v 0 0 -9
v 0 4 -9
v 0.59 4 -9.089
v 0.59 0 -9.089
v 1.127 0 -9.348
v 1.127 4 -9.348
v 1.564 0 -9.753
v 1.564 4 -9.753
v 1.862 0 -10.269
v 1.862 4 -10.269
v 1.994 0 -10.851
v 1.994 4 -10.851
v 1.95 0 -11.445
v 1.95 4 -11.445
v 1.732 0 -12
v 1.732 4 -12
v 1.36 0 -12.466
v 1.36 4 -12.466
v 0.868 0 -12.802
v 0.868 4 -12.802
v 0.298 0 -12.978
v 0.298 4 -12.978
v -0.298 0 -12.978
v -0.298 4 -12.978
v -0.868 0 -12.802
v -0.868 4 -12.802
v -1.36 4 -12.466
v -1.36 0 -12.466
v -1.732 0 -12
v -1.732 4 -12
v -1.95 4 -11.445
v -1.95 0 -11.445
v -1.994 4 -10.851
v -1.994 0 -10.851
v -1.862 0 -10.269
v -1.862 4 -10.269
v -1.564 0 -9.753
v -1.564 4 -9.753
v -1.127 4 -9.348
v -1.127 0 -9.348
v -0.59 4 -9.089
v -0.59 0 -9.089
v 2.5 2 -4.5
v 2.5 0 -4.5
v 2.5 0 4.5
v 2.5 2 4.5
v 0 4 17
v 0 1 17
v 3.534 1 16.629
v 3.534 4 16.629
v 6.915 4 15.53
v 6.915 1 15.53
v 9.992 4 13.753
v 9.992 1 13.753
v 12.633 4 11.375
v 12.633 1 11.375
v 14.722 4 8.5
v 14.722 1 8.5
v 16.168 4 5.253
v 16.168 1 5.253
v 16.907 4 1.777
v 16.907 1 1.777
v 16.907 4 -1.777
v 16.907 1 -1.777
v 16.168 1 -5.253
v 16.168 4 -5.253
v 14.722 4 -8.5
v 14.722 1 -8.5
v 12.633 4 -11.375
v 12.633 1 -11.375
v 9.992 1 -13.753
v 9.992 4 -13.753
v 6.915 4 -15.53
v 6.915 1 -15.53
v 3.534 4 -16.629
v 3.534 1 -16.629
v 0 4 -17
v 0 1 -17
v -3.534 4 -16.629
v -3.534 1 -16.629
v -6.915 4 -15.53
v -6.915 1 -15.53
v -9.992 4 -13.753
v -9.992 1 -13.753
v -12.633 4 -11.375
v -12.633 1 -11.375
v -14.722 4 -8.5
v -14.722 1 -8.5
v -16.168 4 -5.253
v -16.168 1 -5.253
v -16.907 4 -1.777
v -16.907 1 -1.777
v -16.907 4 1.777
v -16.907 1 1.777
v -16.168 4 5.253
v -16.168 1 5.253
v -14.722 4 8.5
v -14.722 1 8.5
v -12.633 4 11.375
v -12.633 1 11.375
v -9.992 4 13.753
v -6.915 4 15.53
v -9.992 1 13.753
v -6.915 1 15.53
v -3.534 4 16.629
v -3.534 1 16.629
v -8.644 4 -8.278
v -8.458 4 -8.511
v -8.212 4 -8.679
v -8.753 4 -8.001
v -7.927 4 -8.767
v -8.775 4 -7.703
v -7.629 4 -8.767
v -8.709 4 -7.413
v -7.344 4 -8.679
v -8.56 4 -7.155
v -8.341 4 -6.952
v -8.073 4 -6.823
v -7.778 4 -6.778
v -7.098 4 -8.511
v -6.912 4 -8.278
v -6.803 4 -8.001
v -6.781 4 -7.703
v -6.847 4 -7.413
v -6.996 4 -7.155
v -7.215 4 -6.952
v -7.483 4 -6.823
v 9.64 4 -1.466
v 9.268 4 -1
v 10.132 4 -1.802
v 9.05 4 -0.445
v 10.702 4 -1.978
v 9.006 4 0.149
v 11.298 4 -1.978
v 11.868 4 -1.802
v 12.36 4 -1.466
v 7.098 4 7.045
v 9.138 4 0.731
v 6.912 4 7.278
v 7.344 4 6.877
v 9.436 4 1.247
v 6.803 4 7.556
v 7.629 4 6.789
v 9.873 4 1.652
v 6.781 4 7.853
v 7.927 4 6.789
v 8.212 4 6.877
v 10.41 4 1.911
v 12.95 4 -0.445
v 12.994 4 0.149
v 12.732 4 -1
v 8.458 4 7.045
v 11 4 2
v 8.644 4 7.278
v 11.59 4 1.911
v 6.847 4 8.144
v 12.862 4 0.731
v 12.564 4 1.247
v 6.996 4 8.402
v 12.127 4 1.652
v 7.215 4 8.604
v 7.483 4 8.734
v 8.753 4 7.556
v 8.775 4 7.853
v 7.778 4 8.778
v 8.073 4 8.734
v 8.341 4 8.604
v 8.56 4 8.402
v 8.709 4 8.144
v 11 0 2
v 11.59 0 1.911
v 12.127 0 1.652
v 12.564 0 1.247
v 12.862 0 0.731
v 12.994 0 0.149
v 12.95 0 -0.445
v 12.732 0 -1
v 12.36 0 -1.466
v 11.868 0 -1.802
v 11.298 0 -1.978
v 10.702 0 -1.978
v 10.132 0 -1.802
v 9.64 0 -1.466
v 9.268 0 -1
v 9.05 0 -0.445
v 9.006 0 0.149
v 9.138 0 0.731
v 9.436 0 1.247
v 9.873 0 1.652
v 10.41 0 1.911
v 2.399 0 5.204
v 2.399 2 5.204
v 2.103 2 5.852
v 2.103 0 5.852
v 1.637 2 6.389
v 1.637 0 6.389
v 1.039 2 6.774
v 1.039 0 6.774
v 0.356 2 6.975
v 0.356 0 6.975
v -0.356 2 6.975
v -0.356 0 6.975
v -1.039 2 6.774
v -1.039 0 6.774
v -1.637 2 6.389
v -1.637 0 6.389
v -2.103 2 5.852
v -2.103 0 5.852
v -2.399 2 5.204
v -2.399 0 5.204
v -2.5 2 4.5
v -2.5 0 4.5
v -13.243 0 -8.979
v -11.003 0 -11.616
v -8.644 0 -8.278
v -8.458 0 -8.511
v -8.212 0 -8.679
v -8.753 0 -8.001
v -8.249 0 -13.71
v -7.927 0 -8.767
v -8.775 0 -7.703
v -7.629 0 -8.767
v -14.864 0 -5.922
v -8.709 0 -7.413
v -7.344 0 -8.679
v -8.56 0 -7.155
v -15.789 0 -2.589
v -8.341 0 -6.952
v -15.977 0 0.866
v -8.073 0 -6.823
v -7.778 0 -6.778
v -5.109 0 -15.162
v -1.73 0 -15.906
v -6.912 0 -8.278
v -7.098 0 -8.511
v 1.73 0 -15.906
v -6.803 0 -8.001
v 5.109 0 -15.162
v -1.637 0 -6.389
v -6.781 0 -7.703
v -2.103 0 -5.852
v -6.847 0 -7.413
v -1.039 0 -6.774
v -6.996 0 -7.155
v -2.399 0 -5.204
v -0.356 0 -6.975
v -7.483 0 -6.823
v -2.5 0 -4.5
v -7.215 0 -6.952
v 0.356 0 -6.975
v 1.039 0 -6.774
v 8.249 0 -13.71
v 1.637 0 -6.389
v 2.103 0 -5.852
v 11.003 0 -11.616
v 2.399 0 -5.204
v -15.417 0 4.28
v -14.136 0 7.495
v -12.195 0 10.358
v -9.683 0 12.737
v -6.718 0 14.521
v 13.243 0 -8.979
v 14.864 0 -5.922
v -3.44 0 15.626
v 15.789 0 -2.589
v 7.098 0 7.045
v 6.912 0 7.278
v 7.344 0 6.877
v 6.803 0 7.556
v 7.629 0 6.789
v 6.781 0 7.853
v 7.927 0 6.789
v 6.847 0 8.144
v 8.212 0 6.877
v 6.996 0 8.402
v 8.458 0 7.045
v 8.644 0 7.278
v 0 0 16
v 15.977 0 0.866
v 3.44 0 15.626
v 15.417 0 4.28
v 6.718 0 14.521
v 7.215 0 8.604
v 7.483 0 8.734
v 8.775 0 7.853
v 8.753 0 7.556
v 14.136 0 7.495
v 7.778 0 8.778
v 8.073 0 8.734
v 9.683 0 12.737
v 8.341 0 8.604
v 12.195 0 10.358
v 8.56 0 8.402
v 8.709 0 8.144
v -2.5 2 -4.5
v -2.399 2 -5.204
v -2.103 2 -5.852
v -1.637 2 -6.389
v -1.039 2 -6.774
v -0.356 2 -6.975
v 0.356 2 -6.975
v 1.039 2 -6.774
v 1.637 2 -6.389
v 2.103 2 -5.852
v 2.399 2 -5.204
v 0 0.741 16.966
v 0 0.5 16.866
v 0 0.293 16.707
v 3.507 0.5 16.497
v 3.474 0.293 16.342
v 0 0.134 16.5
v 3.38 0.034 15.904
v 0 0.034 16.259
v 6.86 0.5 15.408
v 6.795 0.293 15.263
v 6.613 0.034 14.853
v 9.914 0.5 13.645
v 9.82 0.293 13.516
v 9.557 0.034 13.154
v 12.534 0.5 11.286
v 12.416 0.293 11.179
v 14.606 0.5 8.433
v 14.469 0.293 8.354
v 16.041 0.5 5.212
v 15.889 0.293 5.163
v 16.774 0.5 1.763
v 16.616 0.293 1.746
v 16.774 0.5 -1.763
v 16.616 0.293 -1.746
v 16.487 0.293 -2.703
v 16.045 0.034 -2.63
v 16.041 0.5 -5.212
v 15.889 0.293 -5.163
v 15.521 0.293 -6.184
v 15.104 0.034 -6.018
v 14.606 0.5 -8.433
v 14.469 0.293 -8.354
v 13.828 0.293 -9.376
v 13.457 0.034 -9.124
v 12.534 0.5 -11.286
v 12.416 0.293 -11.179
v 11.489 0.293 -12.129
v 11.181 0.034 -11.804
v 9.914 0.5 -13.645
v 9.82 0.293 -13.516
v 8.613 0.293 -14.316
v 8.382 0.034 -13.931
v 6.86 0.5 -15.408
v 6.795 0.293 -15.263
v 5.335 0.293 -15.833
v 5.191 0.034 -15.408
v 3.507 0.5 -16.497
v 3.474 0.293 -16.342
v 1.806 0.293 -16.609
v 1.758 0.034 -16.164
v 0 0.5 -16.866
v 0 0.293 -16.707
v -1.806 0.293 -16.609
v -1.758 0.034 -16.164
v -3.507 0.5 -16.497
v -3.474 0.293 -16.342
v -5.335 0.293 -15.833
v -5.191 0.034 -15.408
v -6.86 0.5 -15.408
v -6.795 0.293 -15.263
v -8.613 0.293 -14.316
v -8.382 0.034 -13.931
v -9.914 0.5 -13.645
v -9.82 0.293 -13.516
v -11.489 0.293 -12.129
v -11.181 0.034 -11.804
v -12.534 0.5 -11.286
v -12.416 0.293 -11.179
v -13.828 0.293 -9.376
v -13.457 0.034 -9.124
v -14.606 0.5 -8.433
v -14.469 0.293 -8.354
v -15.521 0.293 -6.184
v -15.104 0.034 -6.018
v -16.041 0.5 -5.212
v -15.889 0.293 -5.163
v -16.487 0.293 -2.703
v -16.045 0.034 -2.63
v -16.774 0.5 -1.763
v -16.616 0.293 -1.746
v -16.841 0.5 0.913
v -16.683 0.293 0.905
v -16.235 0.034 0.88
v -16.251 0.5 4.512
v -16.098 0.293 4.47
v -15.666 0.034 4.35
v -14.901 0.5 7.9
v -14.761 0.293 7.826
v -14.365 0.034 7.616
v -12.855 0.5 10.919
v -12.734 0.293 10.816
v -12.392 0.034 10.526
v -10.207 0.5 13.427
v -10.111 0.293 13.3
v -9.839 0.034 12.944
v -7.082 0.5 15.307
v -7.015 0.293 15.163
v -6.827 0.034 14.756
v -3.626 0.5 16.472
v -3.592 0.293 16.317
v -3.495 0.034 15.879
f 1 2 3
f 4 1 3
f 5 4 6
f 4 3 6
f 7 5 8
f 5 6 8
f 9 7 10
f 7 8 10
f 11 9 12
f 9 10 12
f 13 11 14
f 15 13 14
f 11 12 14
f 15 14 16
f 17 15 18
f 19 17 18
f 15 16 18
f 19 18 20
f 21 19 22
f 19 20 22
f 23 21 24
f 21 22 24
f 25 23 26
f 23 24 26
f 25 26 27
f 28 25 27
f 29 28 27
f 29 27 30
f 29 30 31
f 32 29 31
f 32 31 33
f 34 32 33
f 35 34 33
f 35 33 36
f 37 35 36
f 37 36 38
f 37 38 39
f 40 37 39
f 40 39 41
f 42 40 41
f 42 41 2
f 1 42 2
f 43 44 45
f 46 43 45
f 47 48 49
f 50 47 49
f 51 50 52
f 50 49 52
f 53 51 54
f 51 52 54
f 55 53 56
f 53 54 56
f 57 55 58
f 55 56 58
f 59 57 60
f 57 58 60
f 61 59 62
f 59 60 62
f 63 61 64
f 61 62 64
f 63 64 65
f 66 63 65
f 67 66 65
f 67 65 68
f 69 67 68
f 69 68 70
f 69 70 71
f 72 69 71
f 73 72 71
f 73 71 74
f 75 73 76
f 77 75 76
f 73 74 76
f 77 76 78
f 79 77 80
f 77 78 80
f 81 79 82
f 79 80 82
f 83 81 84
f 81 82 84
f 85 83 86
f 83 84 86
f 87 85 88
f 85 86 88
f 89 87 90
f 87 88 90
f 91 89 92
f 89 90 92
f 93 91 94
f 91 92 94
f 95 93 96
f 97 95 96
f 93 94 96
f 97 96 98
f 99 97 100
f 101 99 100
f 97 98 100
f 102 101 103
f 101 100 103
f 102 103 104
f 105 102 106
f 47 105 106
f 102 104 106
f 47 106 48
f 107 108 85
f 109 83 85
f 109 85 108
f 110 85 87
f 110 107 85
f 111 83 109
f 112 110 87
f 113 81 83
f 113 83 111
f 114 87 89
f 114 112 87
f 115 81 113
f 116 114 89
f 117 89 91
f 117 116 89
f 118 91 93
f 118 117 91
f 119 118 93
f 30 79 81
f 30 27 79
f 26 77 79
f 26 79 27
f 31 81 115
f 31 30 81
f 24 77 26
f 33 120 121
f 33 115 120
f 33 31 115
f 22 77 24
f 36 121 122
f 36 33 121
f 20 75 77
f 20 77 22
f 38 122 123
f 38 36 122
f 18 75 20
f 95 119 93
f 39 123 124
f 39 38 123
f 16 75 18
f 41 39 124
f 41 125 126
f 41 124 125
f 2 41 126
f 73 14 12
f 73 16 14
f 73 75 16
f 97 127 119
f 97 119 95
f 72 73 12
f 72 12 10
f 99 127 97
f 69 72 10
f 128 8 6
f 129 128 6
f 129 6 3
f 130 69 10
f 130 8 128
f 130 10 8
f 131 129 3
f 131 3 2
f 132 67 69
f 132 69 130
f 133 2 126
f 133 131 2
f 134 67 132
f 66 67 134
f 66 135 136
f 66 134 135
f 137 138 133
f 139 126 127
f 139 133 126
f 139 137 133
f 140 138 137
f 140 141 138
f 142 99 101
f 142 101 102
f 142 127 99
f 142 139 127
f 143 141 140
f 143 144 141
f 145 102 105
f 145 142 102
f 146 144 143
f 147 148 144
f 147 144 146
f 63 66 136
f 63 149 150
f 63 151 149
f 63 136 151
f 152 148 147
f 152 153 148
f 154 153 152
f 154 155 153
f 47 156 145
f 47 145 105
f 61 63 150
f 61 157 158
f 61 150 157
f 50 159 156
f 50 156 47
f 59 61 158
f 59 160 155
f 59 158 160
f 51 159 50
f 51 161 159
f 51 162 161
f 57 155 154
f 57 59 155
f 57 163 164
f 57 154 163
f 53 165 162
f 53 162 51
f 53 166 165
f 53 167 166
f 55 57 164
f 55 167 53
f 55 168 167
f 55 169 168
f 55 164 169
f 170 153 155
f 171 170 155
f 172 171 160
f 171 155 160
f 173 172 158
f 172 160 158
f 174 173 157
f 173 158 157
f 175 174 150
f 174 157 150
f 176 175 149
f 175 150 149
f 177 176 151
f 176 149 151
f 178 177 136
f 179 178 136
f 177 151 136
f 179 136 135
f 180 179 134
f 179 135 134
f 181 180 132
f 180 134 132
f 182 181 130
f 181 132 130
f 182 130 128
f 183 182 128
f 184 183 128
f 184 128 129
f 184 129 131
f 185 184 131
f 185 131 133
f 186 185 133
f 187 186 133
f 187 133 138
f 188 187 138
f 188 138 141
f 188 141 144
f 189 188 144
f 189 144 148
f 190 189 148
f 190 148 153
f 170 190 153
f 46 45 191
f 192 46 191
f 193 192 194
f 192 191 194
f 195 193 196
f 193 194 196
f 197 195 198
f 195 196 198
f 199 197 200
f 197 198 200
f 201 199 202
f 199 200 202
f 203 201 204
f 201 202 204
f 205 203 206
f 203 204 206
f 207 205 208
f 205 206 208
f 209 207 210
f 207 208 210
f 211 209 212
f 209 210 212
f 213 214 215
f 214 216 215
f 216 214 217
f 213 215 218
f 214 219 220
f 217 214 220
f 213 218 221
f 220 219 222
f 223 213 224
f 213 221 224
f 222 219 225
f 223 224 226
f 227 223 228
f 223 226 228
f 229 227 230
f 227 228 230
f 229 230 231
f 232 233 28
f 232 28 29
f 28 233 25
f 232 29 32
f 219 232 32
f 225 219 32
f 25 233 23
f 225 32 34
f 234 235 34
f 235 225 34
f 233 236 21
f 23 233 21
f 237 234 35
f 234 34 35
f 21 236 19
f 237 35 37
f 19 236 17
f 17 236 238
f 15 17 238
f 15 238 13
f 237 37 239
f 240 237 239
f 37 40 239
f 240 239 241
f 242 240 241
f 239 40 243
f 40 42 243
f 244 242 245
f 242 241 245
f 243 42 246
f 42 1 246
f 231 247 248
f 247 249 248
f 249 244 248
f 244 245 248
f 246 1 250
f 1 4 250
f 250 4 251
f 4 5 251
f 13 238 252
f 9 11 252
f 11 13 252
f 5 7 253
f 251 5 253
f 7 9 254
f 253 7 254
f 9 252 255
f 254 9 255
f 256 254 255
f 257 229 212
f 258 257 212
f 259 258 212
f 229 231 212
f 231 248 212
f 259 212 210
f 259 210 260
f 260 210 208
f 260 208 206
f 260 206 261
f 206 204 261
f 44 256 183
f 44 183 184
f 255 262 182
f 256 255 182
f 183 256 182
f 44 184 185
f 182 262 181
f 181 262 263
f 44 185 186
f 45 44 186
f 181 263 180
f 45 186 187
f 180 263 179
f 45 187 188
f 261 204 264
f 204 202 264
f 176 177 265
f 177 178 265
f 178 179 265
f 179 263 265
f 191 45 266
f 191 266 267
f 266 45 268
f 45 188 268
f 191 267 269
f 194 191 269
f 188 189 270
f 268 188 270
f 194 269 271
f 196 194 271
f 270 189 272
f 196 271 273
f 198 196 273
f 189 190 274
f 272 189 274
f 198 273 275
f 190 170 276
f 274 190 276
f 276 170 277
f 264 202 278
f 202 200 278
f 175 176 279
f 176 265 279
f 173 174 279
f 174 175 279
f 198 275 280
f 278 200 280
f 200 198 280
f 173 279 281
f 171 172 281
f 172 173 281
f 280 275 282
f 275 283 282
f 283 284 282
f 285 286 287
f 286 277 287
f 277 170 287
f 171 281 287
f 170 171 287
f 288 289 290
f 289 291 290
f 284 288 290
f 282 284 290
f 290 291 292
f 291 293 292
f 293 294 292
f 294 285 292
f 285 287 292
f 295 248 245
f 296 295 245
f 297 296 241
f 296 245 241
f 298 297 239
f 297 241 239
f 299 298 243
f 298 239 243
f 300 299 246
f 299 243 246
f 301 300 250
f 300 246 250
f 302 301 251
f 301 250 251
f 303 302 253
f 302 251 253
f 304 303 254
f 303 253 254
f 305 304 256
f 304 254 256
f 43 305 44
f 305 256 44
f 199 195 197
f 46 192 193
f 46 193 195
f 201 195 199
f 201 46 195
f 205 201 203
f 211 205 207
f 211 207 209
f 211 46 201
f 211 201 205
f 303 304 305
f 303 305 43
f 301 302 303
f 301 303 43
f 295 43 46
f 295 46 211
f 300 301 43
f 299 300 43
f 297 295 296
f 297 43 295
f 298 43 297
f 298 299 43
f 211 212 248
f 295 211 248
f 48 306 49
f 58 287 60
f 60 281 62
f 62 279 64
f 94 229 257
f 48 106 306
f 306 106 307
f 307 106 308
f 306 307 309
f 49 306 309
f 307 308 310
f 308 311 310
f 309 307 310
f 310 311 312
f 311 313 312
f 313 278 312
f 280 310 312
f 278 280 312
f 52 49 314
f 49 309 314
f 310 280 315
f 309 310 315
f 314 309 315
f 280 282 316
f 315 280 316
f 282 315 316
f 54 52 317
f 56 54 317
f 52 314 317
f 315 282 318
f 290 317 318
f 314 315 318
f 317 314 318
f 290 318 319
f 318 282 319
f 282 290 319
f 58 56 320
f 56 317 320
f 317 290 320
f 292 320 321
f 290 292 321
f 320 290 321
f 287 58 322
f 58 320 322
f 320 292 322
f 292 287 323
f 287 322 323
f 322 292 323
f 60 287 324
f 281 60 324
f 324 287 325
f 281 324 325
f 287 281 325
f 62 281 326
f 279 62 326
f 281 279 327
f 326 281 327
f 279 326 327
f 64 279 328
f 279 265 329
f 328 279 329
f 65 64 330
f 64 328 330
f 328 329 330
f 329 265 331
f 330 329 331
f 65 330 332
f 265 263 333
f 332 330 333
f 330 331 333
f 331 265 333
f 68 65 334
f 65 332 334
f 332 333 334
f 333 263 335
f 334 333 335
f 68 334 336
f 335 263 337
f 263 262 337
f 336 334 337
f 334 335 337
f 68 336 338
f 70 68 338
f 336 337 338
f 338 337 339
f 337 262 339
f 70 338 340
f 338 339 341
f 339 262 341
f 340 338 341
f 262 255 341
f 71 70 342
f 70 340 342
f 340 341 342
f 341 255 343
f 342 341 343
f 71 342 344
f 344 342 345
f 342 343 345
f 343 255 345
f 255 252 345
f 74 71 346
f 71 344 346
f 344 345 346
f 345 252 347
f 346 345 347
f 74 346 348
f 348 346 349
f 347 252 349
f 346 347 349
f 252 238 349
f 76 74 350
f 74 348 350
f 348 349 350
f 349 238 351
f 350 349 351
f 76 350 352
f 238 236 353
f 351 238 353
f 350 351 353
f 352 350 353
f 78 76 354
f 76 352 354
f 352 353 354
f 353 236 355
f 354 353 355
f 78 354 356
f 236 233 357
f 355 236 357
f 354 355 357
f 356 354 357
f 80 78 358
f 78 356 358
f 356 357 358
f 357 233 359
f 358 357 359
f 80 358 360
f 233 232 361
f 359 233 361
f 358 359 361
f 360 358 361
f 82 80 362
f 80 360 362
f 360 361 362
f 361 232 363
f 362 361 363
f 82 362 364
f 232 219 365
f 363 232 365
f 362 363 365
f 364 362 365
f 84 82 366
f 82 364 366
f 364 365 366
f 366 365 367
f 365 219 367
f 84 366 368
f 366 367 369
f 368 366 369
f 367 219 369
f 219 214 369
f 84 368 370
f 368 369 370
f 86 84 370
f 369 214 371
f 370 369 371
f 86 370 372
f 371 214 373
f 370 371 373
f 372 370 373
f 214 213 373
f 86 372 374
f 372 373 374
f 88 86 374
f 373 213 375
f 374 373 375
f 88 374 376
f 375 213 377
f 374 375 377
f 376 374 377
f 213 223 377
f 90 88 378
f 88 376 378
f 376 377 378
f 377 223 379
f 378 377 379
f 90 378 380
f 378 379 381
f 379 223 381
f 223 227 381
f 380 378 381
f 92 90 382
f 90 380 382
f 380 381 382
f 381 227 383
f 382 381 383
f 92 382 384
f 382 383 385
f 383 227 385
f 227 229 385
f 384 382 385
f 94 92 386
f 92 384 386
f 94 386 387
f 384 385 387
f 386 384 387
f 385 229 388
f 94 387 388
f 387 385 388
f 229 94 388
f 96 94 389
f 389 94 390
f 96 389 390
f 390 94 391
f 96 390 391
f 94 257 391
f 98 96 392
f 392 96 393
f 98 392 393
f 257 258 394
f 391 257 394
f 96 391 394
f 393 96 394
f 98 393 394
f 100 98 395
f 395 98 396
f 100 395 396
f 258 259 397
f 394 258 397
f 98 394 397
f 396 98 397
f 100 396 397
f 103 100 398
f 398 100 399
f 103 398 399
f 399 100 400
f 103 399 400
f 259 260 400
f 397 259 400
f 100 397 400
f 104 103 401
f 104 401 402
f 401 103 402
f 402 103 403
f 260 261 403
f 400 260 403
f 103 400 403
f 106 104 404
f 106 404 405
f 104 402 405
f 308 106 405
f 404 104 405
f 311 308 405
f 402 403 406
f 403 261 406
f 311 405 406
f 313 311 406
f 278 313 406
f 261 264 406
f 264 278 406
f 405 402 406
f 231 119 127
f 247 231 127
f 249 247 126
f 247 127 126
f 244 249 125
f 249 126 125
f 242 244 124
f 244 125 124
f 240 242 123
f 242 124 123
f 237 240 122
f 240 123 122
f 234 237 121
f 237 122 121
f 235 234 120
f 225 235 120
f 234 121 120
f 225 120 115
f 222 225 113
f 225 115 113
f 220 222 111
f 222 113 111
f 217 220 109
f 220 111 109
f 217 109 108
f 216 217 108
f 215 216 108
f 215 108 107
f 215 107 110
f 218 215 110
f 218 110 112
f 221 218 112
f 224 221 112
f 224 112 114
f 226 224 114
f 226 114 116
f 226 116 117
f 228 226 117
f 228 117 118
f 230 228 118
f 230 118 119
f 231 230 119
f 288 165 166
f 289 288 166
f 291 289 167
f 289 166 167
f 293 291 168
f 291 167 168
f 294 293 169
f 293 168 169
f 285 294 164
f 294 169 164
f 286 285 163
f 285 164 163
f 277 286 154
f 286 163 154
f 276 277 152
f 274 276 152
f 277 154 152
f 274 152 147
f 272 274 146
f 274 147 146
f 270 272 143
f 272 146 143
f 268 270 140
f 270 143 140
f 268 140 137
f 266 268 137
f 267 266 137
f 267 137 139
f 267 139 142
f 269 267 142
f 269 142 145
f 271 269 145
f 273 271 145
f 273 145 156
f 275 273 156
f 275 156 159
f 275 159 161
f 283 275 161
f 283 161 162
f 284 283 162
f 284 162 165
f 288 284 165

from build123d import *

# Parameters (mm, degrees)
SKETCH_1_R          = 17
EXTRUDE_1_DEPTH     = 4
CUT_EXTRUDE_1_DEPTH = 2
CUT_EXTRUDE_2_REACH = 26.372
SKETCH_3_R          = 2
SKETCH_3_R_2        = 1
FILLET_1_R          = 1


with BuildPart() as part:
    # 草图1 → 凸台-拉伸1 (new body)
    with BuildSketch(Plane(origin=(0, 0, 0), x_dir=(1, 0, 0), z_dir=(0, 1, 0))):
        with Locations(Location((0, 0, 0), (0, 0, 270))):
            Circle(SKETCH_1_R)
    extrude(amount=EXTRUDE_1_DEPTH)

    # 草图2 → 切除-拉伸1 (cut)
    with BuildSketch(Plane(origin=(0, 0, 0), x_dir=(1, 0, 0), z_dir=(0, 1, 0))):
        with BuildLine():
            Line((2.5, 4.5), (2.5, -4.5))
            ThreePointArc((2.5, -4.5), (0, -7), (-2.5, -4.5))
            Line((-2.5, -4.5), (-2.5, 4.5))
            ThreePointArc((-2.5, 4.5), (0, 7), (2.5, 4.5))
        make_face()
    extrude(amount=CUT_EXTRUDE_1_DEPTH, mode=Mode.SUBTRACT)

    # 草图3 → 切除-拉伸2 (cut, up to next)
    with BuildSketch(Plane(origin=(0, 4, 0), x_dir=(1, 0, 0), z_dir=(0, 1, 0)), mode=Mode.PRIVATE) as cut_extrude_2_sk1:
        with Locations(Location((0, 11, 0), (0, 0, 270))):
            Circle(SKETCH_3_R)
    cut_extrude_2_tool1 = extrude(cut_extrude_2_sk1.sketch, amount=-CUT_EXTRUDE_2_REACH, mode=Mode.PRIVATE) & part.part
    # 草图3 → 切除-拉伸2 (cut, up to next)
    with BuildSketch(Plane(origin=(0, 4, 0), x_dir=(1, 0, 0), z_dir=(0, 1, 0)), mode=Mode.PRIVATE) as cut_extrude_2_sk2:
        with Locations(Location((-7.778174593, 7.778174593, 0), (0, 0, 270))):
            Circle(SKETCH_3_R_2)
    cut_extrude_2_tool2 = extrude(cut_extrude_2_sk2.sketch, amount=-CUT_EXTRUDE_2_REACH, mode=Mode.PRIVATE) & part.part
    # 草图3 → 切除-拉伸2 (cut, up to next)
    with BuildSketch(Plane(origin=(0, 4, 0), x_dir=(1, 0, 0), z_dir=(0, 1, 0)), mode=Mode.PRIVATE) as cut_extrude_2_sk3:
        with Locations(Location((11, 0, 0), (0, 0, 270))):
            Circle(SKETCH_3_R)
    cut_extrude_2_tool3 = extrude(cut_extrude_2_sk3.sketch, amount=-CUT_EXTRUDE_2_REACH, mode=Mode.PRIVATE) & part.part
    # 草图3 → 切除-拉伸2 (cut, up to next)
    with BuildSketch(Plane(origin=(0, 4, 0), x_dir=(1, 0, 0), z_dir=(0, 1, 0)), mode=Mode.PRIVATE) as cut_extrude_2_sk4:
        with Locations(Location((7.778174593, -7.778174593, 0), (0, 0, 270))):
            Circle(SKETCH_3_R_2)
    cut_extrude_2_tool4 = extrude(cut_extrude_2_sk4.sketch, amount=-CUT_EXTRUDE_2_REACH, mode=Mode.PRIVATE) & part.part
    add(cut_extrude_2_tool1.solids().sort_by_distance((0, 4, -11))[0], mode=Mode.SUBTRACT)
    add(cut_extrude_2_tool2.solids().sort_by_distance((-7.778175, 4, -7.778175))[0], mode=Mode.SUBTRACT)
    add(cut_extrude_2_tool3.solids().sort_by_distance((11, 4, 0))[0], mode=Mode.SUBTRACT)
    add(cut_extrude_2_tool4.solids().sort_by_distance((7.778175, 4, 7.778175))[0], mode=Mode.SUBTRACT)

    # 圆角1
    fillet_1_edges = [part.edges().sort_by_distance(p)[0] for p in [
        (0, 0, -17),
    ]]
    fillet(fillet_1_edges, radius=FILLET_1_R)


solid = part.part
